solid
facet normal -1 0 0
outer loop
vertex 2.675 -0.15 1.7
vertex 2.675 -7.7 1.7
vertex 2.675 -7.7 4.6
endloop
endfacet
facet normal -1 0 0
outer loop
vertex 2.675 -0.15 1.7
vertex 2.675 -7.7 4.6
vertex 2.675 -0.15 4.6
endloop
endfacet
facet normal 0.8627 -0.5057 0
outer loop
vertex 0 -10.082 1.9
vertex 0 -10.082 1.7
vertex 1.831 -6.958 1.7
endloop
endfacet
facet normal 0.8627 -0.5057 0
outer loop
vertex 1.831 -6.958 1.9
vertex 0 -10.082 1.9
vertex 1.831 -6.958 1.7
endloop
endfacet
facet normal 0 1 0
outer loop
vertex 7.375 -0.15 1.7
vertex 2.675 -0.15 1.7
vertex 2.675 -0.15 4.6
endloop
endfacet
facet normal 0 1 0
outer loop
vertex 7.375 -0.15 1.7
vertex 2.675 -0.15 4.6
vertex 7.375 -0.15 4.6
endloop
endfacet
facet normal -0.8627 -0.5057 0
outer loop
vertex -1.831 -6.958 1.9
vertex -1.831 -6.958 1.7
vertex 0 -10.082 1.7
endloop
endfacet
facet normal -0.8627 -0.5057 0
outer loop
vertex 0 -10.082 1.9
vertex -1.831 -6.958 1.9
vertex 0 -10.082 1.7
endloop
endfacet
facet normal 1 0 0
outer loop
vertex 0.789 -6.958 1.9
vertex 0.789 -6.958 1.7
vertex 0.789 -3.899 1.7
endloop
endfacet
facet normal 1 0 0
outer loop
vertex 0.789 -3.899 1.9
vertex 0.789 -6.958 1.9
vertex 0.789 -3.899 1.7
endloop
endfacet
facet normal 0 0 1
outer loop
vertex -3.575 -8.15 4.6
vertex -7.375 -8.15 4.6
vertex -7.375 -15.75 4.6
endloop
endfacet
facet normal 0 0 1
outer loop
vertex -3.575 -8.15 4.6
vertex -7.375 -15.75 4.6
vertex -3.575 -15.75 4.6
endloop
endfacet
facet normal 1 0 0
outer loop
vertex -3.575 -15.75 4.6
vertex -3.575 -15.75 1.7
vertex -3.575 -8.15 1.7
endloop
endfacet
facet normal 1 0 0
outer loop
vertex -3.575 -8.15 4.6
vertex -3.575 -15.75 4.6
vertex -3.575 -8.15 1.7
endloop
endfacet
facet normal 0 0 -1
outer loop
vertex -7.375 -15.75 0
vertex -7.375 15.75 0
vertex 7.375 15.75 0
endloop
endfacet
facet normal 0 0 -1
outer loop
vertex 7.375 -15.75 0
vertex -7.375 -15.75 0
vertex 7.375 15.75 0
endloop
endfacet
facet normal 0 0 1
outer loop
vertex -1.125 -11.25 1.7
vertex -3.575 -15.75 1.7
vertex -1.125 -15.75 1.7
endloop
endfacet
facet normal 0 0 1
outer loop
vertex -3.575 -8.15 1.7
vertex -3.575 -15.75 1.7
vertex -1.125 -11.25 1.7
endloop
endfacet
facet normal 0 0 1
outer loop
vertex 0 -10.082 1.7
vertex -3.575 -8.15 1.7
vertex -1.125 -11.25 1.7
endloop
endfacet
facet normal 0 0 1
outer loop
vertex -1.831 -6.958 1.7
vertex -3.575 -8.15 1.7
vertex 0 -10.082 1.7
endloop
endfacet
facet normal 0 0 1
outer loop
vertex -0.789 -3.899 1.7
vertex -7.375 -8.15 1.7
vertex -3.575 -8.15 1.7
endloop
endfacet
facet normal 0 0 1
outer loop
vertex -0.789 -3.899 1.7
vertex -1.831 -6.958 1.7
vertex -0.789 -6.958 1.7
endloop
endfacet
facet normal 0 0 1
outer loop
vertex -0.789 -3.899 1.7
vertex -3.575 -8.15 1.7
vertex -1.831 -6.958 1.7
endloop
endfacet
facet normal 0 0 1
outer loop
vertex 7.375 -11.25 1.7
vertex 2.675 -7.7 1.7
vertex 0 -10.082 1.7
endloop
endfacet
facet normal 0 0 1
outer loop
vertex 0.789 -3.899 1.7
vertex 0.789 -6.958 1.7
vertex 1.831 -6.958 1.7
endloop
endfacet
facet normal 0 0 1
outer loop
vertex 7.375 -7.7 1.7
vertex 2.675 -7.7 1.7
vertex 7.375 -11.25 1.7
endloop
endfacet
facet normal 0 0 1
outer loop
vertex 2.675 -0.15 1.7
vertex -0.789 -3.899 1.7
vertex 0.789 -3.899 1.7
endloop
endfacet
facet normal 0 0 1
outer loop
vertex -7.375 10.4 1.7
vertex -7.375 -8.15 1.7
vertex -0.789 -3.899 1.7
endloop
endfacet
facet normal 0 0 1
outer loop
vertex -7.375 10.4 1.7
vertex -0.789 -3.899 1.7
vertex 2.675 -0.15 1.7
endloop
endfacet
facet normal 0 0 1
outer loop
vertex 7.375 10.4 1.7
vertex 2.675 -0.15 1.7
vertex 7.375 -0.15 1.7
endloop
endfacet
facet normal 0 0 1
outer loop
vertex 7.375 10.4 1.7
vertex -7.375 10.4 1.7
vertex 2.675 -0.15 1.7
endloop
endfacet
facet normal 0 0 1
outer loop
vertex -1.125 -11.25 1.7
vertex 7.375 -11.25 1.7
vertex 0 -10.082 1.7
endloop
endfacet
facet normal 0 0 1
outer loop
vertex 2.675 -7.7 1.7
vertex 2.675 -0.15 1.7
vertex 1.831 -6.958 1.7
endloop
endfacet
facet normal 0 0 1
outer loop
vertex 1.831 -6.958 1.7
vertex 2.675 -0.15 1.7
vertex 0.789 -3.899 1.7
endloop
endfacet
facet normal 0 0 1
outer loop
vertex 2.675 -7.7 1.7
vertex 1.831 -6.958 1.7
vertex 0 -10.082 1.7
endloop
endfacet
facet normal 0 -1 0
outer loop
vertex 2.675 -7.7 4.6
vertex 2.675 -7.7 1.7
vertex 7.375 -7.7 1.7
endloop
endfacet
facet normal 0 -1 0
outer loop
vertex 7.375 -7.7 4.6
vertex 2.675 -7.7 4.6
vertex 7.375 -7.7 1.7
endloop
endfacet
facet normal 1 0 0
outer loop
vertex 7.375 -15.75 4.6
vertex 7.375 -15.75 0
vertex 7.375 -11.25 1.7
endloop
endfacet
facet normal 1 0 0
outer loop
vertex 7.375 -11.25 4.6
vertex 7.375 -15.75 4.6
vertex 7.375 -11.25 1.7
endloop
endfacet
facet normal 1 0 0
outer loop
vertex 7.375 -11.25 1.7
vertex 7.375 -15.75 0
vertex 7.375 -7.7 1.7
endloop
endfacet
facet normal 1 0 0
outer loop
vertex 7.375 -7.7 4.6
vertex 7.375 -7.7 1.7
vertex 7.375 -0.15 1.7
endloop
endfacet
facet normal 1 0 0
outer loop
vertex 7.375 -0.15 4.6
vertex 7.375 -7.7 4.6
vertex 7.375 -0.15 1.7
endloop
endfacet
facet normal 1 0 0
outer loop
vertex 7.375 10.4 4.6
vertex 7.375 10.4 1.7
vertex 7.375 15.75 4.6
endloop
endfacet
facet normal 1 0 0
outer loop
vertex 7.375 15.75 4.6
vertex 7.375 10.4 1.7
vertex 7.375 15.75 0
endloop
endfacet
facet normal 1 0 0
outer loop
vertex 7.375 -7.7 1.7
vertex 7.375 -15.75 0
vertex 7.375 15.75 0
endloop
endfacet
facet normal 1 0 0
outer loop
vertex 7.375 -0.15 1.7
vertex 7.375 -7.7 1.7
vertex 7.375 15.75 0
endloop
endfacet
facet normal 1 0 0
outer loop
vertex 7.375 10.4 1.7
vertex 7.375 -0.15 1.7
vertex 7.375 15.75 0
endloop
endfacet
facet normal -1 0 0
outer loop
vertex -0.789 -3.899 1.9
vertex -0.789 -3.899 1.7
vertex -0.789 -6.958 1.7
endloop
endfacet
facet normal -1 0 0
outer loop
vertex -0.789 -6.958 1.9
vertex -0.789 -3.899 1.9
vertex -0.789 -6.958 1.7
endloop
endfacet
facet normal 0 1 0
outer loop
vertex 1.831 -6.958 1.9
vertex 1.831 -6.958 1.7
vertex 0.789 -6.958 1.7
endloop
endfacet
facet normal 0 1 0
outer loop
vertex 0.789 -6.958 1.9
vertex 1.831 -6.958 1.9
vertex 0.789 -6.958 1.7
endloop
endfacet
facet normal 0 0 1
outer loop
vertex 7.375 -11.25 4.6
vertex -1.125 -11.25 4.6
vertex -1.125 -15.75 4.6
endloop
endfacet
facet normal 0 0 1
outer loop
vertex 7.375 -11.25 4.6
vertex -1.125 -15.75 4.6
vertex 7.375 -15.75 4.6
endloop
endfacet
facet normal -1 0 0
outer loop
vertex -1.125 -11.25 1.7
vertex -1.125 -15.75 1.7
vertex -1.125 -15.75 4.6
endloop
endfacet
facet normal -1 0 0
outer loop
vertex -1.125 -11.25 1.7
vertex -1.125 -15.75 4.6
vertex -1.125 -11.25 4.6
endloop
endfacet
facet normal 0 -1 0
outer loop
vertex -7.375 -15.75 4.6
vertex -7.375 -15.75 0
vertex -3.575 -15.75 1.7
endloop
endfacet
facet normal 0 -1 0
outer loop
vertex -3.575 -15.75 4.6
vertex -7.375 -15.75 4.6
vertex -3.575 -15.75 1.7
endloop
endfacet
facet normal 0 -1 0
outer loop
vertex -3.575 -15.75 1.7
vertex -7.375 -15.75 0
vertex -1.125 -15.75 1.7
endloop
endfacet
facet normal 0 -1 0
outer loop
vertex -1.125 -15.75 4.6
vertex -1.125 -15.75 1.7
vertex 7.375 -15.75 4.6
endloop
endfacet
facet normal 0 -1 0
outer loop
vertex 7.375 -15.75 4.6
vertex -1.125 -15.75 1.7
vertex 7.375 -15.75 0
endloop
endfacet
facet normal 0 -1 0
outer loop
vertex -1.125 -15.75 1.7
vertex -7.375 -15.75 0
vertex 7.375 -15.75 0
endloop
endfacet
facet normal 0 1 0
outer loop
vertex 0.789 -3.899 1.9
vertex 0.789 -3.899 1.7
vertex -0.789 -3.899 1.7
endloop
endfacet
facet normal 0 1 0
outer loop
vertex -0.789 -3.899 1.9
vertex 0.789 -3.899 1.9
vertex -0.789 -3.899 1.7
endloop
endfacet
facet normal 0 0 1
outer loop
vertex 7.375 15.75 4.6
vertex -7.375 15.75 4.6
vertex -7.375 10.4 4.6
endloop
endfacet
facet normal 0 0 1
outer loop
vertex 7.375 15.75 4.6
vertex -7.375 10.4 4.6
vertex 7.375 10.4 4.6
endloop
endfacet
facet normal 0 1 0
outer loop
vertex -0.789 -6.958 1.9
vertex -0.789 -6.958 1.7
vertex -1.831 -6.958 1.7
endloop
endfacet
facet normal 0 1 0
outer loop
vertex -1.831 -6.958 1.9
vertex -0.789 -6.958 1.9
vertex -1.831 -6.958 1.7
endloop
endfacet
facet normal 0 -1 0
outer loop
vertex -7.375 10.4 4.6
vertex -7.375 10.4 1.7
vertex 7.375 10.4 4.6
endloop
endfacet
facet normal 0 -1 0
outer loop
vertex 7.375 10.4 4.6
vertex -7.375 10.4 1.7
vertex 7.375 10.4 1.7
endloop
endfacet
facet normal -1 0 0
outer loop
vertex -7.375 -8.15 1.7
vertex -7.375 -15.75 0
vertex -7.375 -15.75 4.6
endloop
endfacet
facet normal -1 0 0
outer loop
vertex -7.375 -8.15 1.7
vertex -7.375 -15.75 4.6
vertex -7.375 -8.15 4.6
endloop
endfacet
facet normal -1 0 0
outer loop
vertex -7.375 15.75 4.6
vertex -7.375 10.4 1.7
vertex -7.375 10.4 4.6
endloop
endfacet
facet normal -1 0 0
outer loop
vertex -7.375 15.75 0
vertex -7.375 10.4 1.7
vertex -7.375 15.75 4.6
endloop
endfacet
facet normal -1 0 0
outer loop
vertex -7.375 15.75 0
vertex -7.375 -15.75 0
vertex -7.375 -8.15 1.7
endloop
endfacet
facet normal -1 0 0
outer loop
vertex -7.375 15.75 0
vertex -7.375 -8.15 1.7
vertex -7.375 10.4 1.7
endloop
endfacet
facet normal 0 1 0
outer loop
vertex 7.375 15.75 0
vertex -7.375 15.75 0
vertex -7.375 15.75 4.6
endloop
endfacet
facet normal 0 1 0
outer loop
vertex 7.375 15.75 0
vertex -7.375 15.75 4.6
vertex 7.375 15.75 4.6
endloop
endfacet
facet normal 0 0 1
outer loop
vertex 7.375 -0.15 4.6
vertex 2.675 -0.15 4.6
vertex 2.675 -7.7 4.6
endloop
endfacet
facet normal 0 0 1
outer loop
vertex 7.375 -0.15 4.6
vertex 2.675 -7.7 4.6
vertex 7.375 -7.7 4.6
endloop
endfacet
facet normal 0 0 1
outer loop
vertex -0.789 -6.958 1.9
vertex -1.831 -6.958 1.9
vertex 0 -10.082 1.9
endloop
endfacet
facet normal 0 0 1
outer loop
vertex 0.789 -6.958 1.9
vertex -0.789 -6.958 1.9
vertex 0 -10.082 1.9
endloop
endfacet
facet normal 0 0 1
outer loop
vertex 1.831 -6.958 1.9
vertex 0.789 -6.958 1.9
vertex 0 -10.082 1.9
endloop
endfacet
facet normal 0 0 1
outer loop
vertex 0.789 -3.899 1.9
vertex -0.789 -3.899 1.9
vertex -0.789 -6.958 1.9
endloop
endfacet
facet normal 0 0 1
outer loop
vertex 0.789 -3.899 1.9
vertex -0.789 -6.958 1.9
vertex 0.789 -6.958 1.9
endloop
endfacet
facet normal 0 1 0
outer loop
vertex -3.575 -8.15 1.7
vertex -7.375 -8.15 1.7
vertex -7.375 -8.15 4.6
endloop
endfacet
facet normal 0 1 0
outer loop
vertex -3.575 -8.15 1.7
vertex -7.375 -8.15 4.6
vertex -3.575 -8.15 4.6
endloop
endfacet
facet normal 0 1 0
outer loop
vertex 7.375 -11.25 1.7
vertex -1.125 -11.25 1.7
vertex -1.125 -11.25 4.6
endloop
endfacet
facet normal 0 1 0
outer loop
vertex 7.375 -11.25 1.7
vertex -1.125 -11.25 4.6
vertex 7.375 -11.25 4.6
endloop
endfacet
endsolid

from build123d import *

# Parameters (mm, degrees)
F0_W     = 14.75
F0_H     = 31.5
F1_DEPTH = 1.7
F2_W     = 14.75
F2_H     = 5.35
F2_W_2   = 8.5
F2_H_2   = 4.5
F2_W_3   = 3.8
F2_H_3   = 7.6
F2_W_4   = 4.7
F2_H_4   = 7.55
F3_DEPTH = 2.9
F5_DEPTH = 0.2


with BuildPart() as f1:
    # F0 (on Top) → F1 (new body)
    with BuildSketch(Plane.XY):
        Rectangle(F0_W, F0_H)
    extrude(amount=F1_DEPTH)

    # F2 (on face) → F3 (join)
    with BuildSketch(Plane.XY.offset(1.7)):
        with Locations((0, 13.075)):
            Rectangle(F2_W, F2_H)
        with Locations((3.125, -13.5)):
            Rectangle(F2_W_2, F2_H_2)
        with Locations((-5.475, -11.95)):
            Rectangle(F2_W_3, F2_H_3)
        with Locations((5.025, -3.925)):
            Rectangle(F2_W_4, F2_H_4)
    extrude(amount=F3_DEPTH)

    # F4 (on face) → F5 (join)
    with BuildSketch(Plane.XY.offset(1.7)):
        Polygon((0.789278, -3.898788), (0, -3.898788), (-0.789278, -3.898788), (-0.789278, -6.957673), (-1.8306, -6.957673), (0, -10.08164), (1.8306, -6.957673), (0.789278, -6.957673), align=None)
    extrude(amount=F5_DEPTH)


solid = f1.part
